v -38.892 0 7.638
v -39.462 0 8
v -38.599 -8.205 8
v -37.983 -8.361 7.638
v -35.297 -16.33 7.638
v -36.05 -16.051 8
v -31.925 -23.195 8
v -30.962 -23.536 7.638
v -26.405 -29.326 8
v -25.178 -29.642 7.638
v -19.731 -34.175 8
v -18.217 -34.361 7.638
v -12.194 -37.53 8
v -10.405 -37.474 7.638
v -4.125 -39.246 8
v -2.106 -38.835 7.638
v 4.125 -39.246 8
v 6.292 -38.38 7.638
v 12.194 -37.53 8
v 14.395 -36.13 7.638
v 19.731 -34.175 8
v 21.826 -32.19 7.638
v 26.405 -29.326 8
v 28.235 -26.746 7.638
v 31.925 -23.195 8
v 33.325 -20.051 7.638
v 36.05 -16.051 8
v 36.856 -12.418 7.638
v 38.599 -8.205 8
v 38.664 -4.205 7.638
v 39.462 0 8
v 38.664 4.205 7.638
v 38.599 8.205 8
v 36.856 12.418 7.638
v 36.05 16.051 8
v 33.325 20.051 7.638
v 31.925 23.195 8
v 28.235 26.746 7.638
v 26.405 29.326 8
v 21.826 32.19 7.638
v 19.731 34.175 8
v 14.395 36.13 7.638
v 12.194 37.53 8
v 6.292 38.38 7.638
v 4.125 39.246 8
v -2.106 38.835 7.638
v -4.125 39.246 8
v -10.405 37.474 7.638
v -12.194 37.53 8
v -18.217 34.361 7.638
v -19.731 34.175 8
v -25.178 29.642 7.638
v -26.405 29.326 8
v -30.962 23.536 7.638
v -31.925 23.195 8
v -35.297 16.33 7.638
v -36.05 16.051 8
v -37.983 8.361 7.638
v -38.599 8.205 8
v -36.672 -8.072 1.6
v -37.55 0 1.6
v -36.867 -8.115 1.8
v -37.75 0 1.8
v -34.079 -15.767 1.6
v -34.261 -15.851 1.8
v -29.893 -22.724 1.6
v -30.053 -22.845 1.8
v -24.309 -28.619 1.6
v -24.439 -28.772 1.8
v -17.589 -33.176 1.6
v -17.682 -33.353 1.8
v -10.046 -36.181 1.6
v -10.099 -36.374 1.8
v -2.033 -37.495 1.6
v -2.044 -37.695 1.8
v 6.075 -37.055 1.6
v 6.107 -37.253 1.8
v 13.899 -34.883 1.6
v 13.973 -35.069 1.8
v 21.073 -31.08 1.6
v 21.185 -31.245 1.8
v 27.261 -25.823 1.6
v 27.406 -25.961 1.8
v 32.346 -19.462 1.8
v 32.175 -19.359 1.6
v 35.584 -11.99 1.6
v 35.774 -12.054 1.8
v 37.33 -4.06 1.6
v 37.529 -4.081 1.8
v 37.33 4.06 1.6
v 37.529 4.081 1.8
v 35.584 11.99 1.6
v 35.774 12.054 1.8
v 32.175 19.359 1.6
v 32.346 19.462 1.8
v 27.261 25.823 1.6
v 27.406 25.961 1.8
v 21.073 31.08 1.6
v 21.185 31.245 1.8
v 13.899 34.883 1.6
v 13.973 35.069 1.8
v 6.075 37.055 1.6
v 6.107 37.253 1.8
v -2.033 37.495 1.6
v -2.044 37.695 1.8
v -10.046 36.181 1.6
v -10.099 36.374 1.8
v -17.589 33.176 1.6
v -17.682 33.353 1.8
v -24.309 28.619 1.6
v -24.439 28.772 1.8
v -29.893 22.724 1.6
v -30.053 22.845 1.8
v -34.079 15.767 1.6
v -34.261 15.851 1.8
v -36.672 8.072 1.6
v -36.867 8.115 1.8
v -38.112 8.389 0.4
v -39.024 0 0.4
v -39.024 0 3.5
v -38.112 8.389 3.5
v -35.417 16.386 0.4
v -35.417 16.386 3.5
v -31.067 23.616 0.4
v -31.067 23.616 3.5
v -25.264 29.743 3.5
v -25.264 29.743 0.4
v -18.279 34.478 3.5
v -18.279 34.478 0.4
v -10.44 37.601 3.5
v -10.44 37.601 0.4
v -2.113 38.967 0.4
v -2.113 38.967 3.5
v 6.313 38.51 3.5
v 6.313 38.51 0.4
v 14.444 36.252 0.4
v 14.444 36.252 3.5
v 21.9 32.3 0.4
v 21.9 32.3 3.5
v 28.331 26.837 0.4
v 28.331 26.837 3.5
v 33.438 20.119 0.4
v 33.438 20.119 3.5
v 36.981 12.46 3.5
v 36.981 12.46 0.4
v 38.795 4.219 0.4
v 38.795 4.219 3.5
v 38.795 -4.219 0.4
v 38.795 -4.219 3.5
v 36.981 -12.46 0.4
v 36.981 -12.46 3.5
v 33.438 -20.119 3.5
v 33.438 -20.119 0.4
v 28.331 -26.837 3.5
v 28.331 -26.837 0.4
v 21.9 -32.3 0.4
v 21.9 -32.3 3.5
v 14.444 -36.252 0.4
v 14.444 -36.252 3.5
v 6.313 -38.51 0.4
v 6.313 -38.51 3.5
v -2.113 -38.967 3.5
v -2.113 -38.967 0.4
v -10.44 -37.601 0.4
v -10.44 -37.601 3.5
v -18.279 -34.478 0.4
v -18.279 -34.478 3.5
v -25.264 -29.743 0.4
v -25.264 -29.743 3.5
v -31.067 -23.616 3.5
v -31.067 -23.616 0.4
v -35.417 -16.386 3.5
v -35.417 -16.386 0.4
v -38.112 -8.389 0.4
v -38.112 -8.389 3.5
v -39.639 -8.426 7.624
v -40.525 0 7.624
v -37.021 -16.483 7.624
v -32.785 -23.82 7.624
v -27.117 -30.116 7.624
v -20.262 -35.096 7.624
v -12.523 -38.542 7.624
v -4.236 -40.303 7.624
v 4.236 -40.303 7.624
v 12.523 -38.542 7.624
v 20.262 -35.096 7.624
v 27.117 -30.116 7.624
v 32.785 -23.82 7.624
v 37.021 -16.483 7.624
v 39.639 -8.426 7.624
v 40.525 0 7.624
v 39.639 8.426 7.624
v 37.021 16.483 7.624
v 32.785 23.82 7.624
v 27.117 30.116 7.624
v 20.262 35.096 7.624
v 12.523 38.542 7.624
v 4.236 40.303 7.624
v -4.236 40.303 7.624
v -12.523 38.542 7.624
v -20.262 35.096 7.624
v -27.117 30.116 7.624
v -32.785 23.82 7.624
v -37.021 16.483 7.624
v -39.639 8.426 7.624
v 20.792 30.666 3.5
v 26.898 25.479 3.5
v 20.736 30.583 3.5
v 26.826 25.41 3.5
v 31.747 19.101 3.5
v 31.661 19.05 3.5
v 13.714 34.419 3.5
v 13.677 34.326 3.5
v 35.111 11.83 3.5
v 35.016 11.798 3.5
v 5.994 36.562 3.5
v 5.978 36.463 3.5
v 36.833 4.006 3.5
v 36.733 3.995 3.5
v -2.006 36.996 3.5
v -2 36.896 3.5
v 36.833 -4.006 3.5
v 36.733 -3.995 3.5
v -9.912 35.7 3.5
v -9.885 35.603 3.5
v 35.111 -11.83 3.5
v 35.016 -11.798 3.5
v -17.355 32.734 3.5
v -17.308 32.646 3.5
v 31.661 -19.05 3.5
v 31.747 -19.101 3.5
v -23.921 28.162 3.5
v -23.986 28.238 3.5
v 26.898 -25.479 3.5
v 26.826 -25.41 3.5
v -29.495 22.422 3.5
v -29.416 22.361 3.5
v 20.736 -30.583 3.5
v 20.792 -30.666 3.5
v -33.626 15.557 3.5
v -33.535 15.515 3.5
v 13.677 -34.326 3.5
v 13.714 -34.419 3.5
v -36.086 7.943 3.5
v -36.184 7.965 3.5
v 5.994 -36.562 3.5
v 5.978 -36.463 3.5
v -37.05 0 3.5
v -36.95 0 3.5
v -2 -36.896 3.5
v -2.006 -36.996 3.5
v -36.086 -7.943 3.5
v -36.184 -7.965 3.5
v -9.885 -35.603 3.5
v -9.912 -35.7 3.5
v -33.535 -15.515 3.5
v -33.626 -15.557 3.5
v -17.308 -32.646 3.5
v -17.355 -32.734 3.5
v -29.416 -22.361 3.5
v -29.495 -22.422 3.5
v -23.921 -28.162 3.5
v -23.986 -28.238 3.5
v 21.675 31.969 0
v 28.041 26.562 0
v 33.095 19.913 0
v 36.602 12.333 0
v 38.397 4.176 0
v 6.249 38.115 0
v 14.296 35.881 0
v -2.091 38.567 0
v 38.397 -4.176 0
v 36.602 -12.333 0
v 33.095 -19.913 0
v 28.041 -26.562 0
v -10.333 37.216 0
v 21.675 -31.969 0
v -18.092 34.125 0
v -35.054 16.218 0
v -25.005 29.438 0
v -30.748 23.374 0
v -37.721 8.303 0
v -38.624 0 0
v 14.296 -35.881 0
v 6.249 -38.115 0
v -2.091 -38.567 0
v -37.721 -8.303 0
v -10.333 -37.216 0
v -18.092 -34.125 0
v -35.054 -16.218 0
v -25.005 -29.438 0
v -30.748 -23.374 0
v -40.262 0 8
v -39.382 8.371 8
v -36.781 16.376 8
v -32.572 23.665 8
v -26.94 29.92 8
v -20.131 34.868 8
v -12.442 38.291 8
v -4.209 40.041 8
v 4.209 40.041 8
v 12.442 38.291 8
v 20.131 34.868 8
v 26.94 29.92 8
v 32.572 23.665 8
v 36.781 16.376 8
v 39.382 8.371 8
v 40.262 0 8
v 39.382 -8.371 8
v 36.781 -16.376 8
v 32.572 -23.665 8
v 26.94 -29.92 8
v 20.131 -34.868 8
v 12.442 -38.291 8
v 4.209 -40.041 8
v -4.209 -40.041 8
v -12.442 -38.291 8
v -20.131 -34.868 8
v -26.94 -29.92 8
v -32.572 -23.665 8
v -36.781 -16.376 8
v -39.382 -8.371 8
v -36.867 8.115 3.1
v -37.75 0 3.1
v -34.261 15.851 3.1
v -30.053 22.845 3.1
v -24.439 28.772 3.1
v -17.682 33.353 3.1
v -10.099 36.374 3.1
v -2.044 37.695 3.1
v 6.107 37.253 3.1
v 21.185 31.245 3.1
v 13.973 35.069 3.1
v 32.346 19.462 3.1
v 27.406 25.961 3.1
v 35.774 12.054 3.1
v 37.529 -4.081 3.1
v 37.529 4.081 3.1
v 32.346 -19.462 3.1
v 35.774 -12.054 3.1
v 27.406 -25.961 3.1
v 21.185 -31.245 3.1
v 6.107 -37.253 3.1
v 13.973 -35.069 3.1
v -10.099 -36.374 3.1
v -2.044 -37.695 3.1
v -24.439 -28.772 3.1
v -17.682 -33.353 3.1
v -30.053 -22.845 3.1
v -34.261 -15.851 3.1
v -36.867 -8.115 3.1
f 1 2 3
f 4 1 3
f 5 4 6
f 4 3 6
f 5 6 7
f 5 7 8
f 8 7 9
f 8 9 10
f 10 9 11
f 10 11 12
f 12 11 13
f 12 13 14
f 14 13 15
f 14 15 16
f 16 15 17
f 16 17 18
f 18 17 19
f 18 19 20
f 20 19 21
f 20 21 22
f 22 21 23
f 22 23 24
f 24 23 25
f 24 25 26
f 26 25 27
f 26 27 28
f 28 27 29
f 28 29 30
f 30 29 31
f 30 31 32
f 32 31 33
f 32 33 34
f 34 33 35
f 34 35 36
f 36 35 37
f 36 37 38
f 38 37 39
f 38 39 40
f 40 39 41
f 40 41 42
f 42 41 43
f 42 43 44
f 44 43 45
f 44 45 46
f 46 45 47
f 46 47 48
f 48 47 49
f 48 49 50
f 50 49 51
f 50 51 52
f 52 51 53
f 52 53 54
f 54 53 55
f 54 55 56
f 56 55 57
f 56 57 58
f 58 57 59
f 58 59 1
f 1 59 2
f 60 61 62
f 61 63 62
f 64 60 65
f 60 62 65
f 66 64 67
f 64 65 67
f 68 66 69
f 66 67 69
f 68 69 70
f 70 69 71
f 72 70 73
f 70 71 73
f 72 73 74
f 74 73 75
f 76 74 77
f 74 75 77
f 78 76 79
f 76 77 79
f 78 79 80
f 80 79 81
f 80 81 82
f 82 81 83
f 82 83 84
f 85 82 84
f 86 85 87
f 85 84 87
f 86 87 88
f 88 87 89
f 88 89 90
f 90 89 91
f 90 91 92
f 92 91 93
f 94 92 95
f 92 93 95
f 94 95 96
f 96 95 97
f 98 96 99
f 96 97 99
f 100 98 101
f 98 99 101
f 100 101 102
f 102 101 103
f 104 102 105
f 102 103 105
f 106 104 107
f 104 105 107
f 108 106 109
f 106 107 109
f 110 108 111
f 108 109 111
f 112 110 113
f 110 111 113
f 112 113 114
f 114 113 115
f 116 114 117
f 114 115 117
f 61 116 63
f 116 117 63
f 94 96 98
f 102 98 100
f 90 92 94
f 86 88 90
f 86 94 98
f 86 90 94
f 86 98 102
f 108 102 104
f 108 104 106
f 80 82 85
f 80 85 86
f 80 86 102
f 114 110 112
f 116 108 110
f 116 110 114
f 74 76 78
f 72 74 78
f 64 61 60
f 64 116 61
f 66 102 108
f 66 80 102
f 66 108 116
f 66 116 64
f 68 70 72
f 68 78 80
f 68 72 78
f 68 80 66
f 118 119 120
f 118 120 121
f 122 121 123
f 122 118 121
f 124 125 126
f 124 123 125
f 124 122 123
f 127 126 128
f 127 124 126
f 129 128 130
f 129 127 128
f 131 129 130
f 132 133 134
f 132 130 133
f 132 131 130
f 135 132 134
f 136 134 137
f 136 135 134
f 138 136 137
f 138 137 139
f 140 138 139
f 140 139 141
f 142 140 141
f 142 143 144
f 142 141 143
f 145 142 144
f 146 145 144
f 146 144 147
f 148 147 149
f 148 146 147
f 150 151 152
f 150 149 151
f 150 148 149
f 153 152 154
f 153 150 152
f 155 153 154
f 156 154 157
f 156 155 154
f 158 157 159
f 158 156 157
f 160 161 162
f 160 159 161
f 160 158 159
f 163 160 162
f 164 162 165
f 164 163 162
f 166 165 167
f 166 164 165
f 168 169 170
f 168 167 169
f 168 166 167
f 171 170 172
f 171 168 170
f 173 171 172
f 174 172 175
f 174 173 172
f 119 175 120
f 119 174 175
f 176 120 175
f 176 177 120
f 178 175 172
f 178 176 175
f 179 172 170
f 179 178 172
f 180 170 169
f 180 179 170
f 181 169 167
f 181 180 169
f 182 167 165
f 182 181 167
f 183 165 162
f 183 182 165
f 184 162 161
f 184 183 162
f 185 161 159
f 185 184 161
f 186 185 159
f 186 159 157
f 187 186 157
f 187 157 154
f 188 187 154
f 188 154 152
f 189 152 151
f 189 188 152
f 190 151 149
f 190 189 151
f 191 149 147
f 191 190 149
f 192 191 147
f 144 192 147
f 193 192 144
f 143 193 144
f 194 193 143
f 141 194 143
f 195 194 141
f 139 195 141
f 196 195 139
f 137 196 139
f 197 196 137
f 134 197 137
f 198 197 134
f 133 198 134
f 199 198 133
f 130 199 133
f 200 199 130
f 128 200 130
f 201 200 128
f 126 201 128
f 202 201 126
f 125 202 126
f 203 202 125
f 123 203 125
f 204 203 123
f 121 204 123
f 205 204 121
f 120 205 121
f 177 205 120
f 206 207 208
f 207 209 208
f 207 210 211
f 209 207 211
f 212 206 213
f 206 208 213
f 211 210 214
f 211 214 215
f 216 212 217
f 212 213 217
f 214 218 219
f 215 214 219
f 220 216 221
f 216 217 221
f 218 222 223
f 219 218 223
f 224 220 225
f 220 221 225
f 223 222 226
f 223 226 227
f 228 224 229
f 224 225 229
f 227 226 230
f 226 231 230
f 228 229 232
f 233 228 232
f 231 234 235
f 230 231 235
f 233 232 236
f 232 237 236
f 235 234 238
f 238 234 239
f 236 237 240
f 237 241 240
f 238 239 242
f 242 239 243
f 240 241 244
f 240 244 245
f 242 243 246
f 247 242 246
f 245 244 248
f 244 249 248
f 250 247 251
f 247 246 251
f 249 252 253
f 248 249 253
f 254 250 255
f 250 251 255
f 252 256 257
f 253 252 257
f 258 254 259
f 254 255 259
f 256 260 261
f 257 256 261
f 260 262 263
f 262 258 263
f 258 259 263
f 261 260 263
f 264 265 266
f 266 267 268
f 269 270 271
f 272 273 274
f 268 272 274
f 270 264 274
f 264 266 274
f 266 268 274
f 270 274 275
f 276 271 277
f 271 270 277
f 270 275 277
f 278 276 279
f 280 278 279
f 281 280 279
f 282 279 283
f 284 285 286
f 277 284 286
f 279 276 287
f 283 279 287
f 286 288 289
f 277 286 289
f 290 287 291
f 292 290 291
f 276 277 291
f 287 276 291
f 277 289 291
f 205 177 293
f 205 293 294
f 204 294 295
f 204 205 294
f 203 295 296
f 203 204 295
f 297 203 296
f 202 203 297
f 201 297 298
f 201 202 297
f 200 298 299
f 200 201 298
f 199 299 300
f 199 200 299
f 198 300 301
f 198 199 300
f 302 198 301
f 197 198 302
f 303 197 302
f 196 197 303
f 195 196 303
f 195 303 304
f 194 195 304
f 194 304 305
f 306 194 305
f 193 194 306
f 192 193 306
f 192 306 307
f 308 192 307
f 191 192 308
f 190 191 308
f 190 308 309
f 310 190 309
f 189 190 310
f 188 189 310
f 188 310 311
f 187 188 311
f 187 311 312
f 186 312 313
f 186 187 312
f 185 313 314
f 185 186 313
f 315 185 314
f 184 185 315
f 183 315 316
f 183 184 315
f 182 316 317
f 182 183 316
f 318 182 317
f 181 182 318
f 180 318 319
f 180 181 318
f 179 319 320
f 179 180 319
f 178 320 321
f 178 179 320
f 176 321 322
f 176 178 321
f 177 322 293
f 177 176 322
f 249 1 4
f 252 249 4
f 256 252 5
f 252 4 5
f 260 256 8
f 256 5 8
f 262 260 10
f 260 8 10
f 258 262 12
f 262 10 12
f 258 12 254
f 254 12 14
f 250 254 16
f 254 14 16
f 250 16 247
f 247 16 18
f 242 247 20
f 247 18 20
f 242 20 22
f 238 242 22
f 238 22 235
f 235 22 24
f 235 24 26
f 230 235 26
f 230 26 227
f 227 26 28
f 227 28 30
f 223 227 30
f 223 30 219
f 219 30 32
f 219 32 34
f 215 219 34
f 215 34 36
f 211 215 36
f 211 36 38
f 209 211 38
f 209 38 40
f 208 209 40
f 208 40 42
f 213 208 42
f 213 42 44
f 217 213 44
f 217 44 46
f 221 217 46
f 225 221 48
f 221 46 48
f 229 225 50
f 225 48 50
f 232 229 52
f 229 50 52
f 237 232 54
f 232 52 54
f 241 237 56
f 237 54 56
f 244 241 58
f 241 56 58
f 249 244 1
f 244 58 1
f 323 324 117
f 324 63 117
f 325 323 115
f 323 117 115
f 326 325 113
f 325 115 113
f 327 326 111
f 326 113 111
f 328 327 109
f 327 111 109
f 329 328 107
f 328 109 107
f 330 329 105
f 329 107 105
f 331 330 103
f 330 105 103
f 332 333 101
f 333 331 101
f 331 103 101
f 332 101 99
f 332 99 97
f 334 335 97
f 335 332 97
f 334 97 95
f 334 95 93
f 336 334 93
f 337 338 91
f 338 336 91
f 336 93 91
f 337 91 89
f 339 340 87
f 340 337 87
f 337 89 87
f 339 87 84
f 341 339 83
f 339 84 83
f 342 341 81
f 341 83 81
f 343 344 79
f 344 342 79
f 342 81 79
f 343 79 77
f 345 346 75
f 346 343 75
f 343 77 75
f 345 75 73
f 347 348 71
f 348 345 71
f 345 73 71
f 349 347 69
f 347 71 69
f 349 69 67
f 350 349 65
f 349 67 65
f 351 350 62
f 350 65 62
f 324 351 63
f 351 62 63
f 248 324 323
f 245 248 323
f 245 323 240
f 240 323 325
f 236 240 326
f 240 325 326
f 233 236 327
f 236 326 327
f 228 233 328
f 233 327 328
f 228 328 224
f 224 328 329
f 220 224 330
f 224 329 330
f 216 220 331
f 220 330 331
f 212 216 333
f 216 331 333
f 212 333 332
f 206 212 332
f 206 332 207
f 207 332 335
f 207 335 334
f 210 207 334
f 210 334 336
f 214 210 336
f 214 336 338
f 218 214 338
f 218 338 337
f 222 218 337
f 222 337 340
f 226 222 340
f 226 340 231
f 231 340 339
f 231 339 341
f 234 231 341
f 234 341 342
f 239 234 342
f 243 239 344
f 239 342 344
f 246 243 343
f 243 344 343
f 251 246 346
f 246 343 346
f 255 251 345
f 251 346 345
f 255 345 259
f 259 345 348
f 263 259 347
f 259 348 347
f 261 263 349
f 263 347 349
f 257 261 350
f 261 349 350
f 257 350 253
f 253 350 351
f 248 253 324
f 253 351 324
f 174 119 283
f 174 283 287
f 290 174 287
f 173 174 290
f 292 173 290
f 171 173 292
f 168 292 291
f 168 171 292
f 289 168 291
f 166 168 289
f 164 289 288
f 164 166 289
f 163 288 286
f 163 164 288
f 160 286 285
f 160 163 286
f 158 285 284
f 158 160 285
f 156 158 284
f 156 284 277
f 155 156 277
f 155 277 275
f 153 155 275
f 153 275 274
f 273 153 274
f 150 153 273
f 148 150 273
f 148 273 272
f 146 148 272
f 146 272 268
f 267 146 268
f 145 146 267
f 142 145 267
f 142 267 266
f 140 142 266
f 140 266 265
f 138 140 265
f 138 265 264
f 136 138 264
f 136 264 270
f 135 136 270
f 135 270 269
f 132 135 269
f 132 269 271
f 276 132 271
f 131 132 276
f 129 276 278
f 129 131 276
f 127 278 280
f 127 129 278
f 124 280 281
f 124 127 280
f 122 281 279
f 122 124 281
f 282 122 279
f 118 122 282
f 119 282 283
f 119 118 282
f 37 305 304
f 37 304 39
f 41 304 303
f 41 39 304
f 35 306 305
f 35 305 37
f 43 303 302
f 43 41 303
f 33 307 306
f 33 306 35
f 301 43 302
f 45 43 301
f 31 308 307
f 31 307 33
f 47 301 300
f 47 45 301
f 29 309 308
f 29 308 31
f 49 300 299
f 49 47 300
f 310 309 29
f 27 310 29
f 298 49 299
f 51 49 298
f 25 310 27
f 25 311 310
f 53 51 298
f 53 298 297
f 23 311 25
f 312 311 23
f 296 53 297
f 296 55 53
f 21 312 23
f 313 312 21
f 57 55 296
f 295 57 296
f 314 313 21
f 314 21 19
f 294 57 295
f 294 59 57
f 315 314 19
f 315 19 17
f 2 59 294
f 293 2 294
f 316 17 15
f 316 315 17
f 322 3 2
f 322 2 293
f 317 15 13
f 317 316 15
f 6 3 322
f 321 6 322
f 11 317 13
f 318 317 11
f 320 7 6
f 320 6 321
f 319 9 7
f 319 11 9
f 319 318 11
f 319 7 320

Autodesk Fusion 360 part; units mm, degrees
sketch "Sketch1" plane through (0, 0, 0) normal (0, 1, 0) x (1, 0, 0)
  line L0 (0, 0) -> (-37.75, 0)
  line L1 (-37.75, 0) -> (-40.6618, -8)
  line L2 (-40.6618, -8) -> (-39.0618, -8)
  line L3 (-39.0618, -8) -> (-36.95, -3.5)
  line L4 (-36.95, -3.5) -> (-37.75, -3.5)
  line L5 (-37.75, -3.5) -> (-37.75, -1.6)
  line L6 (-37.75, -1.6) -> (0, -1.6)
  line L7 (0, -1.6) -> (0, 0)
  line L8 (0, -1.6) -> (0, -8)
  line L9 (-39.0239, -3.5) -> (-39.0239, 0)
  line L10 (-39.0239, 0) -> (-37.75, 0)
  dimension "d1" = 75.5
  dimension "d2" = 1.6
  dimension "d3" = 0.8
  dimension "d4" = 1.9
  dimension "d5" = 8
  dimension "d6" = 1.6
  dimension "d7" = 110
  dimension "d9" = 75.5
revolve "Revolve1" add sketch "Sketch1" angle 360 about axis through (0, 0, 1.6) along (0, 0, 1)
chamfer "Chamfer1" distance 0.2 angle 45 1 edges at (-35.1954, 13.651, 1.6)
chamfer "Chamfer2" distance 0.7 distance2 0.4 1 edges at (-35.1954, 13.651, 3.5) measured on face at (11.897, 35.4466, 3.5)
chamfer "Chamfer3" distance 0.4 distance2 0.4 2 edges at (-36.4183, 14.1253, 8) (-37.9101, 14.7039, 8) measured on face at (-39.8316, 3.9607, 8) measured on face at (-39.9165, 3.9942, 6.5)
chamfer "Chamfer4" distance 0.4 distance2 0.4 1 edges at (-36.383, 14.1116, 0) measured on face at (0.5395, 14.867, 0)
equation "d1 = d"
equation "d2 = t"
equation "d3 = x"
equation "d4 = h"
equation "d5 = height"
equation "d6 = t"
equation "d9 = d"
equation "d = 75.5 mm" comment "Průměr víčka"
equation "h = 1.9 mm" comment "Tloušťka víčka"
equation "t = 1.6 mm" comment "Tloušťka stěny"
equation "x = 0.8 mm" comment "Šířka ozubu"
equation "height = 8 mm" comment "Celková výška víčka"
